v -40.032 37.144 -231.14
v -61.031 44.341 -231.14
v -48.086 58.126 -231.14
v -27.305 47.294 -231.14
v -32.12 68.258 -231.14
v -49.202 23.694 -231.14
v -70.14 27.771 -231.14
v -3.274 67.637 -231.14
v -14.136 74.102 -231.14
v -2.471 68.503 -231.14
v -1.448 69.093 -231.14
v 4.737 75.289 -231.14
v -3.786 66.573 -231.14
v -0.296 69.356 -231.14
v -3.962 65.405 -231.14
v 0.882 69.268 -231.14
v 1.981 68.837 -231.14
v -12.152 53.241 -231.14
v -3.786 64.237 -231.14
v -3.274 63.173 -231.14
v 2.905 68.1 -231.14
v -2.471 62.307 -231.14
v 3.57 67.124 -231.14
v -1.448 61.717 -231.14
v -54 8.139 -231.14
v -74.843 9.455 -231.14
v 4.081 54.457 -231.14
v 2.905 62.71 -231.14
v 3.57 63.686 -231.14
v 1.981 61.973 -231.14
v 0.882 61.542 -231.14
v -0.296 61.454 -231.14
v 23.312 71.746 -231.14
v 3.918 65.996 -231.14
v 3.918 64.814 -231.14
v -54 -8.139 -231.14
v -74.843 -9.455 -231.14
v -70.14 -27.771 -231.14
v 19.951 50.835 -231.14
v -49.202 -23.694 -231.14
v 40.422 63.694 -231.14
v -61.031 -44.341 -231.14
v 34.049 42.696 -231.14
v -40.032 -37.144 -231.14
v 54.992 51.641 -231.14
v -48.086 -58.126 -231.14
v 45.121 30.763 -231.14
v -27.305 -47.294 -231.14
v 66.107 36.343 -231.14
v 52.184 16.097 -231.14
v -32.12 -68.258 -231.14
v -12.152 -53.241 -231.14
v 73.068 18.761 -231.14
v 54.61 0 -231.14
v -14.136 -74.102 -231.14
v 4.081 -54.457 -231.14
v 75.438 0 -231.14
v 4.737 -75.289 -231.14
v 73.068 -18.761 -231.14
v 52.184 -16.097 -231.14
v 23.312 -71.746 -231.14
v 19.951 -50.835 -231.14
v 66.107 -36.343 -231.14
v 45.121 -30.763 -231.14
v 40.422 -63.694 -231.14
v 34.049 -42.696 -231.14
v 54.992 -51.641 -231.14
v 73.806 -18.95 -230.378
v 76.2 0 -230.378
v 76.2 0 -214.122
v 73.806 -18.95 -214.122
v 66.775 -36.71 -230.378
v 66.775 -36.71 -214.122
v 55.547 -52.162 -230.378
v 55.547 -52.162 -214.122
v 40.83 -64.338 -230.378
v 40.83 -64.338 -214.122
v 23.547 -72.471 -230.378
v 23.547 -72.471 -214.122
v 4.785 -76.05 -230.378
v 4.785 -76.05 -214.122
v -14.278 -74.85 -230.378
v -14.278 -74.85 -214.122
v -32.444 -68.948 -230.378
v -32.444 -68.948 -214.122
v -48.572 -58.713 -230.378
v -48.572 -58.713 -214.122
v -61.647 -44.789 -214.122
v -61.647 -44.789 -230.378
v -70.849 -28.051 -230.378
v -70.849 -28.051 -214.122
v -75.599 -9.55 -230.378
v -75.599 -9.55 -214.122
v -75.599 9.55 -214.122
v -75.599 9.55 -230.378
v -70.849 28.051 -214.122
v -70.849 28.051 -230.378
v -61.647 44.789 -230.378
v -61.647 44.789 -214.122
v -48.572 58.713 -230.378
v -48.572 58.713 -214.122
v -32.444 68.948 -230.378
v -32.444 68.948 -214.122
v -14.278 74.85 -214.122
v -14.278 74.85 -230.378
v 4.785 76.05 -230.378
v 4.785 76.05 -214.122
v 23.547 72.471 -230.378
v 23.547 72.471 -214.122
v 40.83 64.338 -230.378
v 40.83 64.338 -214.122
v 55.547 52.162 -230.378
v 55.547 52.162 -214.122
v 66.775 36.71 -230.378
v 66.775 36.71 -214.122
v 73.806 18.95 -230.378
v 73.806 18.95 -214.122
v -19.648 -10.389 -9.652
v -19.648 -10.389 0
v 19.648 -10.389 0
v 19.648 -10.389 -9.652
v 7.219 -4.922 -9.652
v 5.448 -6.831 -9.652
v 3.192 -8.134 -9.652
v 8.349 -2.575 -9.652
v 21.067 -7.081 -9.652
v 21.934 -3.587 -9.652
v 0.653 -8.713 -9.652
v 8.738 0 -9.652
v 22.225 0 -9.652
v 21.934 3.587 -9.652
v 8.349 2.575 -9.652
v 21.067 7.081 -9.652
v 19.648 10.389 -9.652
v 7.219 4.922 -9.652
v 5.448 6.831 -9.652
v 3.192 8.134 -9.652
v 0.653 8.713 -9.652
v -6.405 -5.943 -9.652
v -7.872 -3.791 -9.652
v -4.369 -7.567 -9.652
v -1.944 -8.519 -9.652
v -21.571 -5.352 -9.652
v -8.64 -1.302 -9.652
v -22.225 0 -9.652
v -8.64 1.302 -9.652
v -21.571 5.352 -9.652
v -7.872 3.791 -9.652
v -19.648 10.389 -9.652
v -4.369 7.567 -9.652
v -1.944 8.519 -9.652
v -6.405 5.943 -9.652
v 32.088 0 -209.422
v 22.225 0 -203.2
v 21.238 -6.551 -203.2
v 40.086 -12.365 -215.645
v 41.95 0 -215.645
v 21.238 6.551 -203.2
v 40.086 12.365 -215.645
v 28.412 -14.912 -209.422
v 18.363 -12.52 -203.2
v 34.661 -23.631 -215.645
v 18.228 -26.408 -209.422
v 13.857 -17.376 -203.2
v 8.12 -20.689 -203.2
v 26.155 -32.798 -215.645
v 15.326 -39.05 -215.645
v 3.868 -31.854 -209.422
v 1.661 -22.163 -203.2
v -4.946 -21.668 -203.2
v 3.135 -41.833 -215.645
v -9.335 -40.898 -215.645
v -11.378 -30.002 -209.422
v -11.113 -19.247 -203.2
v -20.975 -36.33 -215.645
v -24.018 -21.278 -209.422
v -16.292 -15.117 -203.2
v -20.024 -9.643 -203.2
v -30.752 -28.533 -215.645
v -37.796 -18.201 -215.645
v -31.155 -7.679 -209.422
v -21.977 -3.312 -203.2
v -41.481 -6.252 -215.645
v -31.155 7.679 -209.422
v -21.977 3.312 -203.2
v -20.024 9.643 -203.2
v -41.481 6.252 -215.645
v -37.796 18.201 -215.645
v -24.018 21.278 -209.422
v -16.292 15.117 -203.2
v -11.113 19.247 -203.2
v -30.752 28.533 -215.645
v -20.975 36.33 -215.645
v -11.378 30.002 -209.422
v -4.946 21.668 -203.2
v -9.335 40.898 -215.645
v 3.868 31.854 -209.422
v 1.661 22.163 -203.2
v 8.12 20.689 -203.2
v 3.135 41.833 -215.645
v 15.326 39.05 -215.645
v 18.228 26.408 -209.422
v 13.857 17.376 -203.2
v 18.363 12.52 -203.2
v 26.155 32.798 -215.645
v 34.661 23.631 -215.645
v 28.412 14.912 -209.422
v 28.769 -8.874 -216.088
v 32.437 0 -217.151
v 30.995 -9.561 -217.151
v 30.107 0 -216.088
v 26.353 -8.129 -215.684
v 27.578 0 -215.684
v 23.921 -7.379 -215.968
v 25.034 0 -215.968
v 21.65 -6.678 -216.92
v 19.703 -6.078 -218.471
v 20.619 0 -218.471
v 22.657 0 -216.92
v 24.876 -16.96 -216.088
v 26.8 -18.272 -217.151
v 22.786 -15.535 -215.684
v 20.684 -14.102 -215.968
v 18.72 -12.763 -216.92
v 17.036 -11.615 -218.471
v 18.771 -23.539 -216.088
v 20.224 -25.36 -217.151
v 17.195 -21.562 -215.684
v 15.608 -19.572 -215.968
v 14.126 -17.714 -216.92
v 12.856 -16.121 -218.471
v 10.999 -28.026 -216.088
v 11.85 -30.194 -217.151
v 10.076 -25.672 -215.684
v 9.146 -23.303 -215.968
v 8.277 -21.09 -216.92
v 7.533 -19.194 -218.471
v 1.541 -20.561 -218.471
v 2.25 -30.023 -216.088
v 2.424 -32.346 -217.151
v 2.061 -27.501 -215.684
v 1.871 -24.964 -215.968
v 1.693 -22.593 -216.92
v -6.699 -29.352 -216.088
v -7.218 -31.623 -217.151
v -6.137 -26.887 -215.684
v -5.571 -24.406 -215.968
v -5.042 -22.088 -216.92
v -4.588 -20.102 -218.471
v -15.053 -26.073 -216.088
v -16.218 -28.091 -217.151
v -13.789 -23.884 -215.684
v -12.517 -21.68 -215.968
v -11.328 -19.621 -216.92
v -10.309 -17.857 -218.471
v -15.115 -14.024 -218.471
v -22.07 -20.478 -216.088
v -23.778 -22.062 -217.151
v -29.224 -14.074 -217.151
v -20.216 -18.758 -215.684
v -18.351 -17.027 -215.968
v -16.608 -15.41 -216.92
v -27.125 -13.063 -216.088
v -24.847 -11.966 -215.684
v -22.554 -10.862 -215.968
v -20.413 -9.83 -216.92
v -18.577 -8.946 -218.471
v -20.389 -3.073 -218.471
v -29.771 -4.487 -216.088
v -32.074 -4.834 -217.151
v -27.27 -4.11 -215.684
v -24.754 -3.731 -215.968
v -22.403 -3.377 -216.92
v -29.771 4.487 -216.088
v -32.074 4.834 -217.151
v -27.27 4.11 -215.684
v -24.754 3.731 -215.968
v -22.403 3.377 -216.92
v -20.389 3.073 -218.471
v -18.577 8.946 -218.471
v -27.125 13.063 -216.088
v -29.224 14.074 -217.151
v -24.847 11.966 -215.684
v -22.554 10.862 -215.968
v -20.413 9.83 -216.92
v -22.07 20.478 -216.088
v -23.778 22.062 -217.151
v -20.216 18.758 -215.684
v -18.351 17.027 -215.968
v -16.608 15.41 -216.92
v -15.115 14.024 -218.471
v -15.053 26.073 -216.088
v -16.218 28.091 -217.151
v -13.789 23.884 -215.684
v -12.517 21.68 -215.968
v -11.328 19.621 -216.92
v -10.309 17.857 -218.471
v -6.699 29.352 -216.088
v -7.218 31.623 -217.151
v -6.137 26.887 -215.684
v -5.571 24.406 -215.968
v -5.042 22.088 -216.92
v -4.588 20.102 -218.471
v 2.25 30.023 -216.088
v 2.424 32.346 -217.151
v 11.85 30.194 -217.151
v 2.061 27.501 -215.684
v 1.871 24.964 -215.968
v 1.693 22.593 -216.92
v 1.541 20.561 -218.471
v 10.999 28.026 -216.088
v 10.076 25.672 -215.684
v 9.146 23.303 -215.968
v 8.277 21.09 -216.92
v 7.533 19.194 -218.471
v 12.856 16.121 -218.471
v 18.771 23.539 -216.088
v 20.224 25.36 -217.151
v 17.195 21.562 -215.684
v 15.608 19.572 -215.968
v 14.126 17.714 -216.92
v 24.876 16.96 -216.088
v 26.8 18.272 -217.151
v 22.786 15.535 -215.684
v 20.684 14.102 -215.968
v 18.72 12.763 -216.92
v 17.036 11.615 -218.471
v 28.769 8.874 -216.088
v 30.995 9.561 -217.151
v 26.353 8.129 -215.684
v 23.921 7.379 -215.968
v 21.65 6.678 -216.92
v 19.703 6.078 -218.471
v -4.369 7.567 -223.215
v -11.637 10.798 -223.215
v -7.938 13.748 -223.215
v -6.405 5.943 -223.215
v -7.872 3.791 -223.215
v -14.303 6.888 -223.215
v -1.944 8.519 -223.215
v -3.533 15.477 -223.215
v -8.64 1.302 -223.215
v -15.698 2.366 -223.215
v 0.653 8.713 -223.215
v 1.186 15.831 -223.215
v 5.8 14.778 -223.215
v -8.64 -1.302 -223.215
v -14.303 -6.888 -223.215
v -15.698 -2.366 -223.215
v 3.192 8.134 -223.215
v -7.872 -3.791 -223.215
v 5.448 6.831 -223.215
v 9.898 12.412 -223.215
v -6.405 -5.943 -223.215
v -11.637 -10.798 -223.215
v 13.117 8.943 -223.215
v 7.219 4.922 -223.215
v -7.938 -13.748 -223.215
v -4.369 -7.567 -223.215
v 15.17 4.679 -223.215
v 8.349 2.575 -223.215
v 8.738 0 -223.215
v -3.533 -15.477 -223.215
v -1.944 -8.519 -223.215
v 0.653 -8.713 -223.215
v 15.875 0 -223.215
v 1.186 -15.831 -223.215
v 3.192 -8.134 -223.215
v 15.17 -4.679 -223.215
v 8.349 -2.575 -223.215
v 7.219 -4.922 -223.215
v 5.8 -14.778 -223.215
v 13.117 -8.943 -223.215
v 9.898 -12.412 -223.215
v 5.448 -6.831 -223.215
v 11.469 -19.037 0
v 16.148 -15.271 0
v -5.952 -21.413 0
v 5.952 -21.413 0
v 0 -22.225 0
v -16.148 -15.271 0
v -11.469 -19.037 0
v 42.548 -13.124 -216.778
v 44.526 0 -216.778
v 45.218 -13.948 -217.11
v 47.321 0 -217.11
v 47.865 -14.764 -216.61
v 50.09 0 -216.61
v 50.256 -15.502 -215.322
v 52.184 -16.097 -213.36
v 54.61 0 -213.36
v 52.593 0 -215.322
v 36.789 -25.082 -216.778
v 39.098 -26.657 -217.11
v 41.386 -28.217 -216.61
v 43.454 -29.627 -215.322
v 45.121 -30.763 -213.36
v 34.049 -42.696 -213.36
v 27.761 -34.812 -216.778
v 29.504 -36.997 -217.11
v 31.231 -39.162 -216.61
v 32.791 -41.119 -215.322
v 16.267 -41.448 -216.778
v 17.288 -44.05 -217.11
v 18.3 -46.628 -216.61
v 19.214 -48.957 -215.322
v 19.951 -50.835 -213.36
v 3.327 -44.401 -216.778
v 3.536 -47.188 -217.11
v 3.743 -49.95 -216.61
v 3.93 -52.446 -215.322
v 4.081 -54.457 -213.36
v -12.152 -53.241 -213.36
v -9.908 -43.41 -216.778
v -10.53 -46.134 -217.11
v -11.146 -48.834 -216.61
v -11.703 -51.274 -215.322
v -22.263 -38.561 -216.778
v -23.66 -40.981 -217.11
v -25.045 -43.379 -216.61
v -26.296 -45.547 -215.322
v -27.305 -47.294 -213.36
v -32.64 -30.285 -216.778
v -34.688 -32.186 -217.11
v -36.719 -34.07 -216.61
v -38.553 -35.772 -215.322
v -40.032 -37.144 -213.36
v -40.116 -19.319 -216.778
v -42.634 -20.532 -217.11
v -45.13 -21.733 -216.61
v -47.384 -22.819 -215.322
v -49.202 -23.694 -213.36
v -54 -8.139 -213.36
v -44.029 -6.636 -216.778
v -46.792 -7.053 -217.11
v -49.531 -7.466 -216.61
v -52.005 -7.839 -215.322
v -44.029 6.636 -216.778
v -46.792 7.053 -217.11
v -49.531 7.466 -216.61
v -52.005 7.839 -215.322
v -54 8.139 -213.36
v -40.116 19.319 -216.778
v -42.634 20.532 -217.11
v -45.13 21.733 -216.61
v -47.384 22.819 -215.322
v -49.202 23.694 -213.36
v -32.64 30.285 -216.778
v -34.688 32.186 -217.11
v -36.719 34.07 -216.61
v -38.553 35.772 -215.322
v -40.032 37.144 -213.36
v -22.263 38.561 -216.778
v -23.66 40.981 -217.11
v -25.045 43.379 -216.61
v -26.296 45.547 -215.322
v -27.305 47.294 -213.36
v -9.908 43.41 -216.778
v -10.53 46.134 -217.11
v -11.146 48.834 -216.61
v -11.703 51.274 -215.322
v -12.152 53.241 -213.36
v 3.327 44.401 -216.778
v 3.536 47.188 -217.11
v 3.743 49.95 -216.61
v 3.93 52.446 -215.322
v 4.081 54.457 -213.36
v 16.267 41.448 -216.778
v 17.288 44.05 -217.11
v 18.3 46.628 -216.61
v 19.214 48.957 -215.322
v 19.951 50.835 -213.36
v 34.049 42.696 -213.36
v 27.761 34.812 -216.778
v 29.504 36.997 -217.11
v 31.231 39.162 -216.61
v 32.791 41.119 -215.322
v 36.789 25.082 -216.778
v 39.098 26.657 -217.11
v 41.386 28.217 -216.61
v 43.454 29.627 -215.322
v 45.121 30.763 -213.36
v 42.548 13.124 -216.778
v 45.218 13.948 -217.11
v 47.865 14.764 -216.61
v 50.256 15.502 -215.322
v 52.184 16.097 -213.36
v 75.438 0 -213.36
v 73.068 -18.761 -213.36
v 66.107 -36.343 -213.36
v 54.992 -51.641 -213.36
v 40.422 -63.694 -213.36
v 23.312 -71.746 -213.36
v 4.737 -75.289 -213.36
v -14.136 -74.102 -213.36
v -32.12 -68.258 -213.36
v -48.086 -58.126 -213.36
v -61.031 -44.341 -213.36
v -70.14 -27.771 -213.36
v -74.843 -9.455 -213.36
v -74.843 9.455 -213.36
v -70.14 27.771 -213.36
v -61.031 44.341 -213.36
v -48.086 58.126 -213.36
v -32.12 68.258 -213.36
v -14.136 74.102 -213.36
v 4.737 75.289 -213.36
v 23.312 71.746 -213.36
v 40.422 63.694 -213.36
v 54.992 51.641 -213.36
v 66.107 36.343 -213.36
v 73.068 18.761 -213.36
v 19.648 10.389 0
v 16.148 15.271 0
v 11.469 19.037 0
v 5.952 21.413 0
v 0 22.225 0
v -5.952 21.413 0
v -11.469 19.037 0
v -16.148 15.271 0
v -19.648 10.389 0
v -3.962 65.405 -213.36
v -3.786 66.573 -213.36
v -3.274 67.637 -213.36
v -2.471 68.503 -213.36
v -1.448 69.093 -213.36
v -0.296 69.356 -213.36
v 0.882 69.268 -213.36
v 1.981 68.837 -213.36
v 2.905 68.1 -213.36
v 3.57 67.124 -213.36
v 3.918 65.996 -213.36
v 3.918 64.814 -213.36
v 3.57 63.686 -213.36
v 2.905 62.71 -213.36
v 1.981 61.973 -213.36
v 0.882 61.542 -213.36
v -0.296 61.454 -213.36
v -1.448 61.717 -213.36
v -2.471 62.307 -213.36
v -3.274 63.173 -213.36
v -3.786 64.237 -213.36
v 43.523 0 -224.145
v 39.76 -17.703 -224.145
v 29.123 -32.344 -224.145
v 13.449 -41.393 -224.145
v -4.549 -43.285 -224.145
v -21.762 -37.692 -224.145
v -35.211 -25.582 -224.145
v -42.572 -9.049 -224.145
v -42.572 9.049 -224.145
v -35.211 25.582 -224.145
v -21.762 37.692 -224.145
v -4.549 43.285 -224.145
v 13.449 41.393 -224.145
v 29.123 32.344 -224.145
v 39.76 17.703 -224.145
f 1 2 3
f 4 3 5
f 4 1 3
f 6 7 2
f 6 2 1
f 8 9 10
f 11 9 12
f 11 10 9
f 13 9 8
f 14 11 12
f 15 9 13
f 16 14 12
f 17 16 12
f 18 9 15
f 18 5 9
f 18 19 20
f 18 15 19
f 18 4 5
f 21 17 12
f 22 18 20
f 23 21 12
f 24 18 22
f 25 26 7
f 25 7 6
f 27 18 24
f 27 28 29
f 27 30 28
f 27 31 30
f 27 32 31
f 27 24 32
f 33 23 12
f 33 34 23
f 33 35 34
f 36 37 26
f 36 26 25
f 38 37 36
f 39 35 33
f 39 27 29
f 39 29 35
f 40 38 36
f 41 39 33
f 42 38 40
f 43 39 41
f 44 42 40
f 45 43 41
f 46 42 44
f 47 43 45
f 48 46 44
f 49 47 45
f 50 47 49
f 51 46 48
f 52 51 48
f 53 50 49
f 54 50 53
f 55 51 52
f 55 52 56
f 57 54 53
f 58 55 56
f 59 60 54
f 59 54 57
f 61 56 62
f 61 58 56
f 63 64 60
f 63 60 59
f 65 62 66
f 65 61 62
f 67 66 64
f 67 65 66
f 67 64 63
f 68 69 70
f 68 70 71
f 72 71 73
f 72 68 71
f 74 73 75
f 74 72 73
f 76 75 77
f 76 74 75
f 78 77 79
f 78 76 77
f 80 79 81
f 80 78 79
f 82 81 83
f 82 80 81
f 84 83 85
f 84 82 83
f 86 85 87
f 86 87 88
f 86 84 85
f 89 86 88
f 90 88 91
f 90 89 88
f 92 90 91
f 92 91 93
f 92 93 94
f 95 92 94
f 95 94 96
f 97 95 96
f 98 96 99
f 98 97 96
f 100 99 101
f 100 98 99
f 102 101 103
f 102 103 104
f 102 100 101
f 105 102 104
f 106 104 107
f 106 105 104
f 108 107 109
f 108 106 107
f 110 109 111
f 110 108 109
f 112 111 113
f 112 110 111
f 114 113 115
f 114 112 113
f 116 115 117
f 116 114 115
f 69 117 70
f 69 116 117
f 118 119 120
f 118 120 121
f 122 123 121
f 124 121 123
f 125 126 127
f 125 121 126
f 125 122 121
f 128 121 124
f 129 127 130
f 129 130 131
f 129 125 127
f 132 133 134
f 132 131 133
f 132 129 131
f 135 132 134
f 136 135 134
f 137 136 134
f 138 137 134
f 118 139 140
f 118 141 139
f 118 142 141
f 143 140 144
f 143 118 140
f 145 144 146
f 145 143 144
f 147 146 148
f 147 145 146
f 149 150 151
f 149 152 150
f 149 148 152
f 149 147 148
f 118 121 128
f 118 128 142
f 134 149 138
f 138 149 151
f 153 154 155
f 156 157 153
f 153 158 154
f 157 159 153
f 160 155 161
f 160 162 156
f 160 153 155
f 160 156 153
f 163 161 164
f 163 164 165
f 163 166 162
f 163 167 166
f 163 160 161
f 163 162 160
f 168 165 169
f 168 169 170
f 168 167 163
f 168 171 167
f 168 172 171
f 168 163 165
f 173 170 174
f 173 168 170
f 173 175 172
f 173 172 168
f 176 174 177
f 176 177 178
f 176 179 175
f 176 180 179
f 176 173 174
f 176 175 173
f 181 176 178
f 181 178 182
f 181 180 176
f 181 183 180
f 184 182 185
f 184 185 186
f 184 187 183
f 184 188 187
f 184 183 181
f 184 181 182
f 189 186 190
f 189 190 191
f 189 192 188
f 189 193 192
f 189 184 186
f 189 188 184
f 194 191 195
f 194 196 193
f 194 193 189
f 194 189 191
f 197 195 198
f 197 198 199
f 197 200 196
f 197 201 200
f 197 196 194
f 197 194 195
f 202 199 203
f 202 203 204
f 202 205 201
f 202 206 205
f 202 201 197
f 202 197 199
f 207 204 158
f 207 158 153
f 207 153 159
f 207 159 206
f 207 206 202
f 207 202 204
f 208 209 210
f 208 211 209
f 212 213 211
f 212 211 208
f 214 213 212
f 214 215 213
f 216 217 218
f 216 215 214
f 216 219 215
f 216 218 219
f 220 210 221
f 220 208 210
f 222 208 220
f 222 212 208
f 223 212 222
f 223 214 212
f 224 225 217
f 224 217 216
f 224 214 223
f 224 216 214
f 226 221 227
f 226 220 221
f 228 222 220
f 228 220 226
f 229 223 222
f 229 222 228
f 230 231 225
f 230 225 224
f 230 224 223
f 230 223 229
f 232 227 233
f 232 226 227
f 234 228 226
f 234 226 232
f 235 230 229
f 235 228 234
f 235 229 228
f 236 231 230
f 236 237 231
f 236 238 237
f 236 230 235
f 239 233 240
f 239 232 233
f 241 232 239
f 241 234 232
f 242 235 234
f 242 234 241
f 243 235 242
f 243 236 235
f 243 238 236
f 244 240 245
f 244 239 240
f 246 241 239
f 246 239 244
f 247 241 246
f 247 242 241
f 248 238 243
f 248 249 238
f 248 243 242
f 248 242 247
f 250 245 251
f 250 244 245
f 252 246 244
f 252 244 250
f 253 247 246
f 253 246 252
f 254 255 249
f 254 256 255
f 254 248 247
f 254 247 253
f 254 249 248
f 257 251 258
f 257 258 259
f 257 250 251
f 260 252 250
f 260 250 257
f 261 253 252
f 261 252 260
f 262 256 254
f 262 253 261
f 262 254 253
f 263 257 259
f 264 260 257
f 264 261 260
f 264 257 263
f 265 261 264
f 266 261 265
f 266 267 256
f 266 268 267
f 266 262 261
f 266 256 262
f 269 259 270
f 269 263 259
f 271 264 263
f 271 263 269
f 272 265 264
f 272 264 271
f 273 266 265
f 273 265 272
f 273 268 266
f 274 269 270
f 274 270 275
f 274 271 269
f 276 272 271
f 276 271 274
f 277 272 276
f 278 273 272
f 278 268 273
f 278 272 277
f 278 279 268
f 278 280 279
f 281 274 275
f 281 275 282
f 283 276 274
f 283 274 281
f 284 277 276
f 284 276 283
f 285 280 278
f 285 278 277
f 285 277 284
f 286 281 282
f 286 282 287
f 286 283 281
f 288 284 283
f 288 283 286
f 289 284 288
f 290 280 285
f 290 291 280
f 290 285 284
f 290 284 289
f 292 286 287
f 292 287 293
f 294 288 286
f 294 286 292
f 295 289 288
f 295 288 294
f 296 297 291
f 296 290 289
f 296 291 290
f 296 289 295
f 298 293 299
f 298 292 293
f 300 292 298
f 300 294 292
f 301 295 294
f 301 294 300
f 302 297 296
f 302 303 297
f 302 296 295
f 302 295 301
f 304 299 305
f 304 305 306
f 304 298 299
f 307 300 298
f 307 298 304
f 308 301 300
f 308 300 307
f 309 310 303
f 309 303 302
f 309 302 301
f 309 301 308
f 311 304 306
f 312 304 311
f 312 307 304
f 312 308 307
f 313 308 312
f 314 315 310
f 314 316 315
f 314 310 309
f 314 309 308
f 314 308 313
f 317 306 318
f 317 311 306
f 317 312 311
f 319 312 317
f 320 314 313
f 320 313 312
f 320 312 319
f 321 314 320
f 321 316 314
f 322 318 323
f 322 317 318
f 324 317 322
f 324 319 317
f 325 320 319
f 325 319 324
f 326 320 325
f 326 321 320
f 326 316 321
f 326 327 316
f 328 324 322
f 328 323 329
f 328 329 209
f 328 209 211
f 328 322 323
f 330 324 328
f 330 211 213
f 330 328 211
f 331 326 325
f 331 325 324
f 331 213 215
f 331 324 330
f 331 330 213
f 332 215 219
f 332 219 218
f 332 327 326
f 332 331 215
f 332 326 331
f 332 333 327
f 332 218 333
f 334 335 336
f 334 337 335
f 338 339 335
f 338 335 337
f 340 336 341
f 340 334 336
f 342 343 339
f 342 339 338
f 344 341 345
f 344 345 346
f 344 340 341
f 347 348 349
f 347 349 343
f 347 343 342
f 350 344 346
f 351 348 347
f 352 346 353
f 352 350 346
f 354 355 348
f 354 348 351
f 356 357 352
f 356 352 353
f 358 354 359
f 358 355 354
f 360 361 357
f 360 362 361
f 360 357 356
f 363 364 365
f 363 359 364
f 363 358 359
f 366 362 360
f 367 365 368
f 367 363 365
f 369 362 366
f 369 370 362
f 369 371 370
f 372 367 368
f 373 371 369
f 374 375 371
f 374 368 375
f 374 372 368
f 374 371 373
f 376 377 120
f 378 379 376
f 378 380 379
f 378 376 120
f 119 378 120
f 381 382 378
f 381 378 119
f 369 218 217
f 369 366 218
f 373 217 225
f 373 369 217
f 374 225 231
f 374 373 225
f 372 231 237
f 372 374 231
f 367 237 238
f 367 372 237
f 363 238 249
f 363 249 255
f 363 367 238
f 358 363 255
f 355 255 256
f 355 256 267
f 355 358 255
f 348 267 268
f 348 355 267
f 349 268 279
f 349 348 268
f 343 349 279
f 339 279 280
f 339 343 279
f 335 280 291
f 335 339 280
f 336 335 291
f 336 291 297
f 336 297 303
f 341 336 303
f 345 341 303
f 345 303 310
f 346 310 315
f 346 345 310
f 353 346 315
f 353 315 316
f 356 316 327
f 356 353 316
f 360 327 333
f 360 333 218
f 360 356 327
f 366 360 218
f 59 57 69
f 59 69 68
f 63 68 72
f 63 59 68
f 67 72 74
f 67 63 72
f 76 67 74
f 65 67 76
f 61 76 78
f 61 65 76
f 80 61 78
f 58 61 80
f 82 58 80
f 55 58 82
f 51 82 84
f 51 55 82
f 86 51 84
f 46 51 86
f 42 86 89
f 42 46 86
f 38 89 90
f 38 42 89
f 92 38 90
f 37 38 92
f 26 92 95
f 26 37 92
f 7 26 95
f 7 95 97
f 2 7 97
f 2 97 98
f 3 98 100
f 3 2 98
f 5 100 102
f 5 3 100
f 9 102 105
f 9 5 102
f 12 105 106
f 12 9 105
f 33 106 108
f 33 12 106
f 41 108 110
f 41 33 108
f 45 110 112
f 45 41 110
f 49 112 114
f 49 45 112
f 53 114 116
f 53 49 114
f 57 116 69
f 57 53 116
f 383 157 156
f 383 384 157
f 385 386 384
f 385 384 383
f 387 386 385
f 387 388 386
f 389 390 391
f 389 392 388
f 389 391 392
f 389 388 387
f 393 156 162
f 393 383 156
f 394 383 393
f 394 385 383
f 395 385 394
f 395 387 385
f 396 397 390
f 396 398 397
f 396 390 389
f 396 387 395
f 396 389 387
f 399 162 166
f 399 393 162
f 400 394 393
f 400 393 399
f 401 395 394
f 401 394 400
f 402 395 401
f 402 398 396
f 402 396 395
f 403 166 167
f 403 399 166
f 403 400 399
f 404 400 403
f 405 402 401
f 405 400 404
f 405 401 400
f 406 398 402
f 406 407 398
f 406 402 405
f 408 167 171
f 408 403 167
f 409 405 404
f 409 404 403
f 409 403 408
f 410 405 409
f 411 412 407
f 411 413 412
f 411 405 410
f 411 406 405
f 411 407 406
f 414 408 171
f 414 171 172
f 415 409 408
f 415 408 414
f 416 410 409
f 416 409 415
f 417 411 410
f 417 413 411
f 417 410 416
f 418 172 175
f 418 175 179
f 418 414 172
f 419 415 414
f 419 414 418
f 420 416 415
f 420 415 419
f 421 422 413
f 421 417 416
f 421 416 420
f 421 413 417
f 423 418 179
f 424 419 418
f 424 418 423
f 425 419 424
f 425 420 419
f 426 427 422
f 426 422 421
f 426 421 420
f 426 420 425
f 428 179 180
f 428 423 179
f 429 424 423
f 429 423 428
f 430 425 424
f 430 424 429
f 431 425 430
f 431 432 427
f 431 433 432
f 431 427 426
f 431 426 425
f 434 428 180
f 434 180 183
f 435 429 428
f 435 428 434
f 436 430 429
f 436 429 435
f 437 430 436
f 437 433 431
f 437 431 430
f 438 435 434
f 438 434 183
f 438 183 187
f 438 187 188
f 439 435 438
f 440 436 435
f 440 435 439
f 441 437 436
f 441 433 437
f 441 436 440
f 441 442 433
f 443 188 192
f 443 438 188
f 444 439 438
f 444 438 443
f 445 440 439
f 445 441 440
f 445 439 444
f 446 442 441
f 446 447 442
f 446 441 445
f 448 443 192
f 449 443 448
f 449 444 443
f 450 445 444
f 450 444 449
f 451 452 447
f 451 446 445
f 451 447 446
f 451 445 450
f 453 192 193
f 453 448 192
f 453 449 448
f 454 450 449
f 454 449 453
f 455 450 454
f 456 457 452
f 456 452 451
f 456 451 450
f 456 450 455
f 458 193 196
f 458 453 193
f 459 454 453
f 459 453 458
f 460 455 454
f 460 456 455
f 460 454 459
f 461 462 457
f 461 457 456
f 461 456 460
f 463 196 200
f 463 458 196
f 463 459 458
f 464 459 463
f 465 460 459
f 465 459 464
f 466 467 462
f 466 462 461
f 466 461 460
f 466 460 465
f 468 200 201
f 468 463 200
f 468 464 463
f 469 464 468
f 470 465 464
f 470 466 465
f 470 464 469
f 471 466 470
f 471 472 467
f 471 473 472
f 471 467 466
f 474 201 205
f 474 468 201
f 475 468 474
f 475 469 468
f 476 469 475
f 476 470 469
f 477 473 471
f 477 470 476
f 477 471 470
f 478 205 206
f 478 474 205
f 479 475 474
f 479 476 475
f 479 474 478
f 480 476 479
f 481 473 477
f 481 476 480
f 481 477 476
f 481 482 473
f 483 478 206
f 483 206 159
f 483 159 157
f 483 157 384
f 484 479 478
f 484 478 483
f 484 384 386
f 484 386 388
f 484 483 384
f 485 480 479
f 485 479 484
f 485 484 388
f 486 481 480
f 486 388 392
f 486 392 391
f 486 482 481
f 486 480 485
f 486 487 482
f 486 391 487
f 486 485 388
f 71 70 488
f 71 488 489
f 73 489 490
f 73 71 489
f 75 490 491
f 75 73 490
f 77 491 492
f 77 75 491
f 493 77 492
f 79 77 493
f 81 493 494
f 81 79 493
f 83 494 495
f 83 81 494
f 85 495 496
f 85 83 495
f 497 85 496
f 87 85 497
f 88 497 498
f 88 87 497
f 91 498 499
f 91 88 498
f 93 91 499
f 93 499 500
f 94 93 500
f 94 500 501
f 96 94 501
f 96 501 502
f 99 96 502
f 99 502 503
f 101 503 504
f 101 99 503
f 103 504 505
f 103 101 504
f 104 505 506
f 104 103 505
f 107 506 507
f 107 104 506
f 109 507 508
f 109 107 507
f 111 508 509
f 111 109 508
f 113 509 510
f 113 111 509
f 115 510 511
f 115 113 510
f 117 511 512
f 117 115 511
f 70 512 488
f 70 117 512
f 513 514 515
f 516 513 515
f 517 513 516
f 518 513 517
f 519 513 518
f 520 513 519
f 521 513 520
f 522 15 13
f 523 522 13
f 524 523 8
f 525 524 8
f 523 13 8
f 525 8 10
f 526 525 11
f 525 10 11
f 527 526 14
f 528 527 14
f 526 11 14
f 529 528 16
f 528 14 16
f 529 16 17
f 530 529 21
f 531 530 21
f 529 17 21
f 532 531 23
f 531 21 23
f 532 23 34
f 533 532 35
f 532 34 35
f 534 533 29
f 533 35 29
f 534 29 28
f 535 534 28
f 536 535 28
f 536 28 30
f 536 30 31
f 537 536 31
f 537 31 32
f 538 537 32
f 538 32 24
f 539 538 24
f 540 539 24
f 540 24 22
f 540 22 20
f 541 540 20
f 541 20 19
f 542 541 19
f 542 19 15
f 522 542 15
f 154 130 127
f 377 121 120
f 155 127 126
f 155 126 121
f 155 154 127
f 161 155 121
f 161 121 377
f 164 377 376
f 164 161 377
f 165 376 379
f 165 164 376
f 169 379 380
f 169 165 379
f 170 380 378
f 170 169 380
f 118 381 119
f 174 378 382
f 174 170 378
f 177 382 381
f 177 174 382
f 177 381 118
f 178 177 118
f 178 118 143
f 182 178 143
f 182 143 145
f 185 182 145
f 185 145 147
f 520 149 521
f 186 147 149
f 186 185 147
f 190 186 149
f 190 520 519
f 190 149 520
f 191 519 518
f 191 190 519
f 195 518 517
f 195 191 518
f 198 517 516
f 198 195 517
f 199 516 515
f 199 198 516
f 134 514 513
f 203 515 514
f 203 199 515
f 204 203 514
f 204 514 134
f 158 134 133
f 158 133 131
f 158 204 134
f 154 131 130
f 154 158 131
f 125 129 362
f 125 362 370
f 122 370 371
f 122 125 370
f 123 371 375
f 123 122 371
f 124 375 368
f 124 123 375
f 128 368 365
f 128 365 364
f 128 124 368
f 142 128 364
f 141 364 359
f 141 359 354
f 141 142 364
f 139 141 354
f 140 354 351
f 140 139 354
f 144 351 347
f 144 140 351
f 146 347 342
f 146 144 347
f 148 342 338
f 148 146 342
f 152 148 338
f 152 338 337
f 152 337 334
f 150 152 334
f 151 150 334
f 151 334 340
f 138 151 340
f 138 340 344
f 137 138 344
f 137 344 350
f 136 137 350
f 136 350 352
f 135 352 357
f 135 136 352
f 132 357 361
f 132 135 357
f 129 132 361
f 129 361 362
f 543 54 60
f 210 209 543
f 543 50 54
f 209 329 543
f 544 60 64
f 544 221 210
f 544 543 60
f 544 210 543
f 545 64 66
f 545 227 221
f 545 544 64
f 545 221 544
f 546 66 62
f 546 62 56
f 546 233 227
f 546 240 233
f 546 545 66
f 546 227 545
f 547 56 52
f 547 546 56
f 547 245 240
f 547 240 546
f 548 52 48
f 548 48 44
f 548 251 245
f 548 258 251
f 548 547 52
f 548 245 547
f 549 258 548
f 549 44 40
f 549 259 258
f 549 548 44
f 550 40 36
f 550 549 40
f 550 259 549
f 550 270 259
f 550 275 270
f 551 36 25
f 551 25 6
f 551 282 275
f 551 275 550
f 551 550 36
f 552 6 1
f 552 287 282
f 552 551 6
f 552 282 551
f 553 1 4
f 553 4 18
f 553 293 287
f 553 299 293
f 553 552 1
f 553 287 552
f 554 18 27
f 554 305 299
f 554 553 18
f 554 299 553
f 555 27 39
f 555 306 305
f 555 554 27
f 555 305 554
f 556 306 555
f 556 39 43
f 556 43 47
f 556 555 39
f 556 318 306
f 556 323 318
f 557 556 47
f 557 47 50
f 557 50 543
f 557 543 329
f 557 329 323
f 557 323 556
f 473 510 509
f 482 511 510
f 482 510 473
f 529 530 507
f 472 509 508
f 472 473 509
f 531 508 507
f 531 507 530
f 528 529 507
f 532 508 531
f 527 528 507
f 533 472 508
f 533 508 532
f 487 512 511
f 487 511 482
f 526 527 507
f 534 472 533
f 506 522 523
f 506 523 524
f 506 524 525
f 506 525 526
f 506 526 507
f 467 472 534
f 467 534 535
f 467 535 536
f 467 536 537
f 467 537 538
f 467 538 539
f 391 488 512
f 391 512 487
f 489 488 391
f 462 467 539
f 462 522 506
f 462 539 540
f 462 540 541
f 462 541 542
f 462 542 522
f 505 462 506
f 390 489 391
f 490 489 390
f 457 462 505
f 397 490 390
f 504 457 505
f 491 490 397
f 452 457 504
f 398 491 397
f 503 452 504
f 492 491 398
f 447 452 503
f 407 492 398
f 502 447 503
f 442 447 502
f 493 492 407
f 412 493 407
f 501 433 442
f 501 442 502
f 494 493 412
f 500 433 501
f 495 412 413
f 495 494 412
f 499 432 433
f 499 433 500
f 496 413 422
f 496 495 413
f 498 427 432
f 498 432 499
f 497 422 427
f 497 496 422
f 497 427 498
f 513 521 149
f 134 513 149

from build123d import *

# Parameters (mm, degrees)
CHAMFER1_SIZE           = 0.762
CUT_EXTRUDE1_DEPTH      = 256.026625277
CUT_EXTRUDE1_DEPTH_BACK = 256.026625277
SKETCH2_W               = 9.652
SKETCH2_H               = 20.7772
SKETCH3_R               = 3.9624
CUT_EXTRUDE2_DEPTH      = 256.026625277


with BuildPart() as part:
    # Sketch1 → Revolve1 (revolve)
    with BuildSketch(Plane(origin=(0, 0, 0), x_dir=(0, 0, -1), z_dir=(1, 0, 0)), mode=Mode.PRIVATE) as revolve1_sk:
        with BuildLine():
            Line((0, 8.7376), (0, 22.225))
            Line((0, 22.225), (203.2, 22.225))
            Line((203.2, 22.225), (215.644604414, 41.950024019))
            ThreePointArc((215.644604414, 41.950024019), (216.962465562, 48.723970202), (213.36, 54.61))
            Line((213.36, 54.61), (213.36, 76.2))
            Line((213.36, 76.2), (231.14, 76.2))
            Line((231.14, 76.2), (231.14, 54.61))
            Line((231.14, 54.61), (217.150682631, 32.43656548))
            ThreePointArc((217.150682631, 32.43656548), (215.740333448, 26.296391433), (218.471224769, 20.618975231))
            Line((218.471224769, 20.618975231), (223.2152, 15.875))
            Line((223.2152, 15.875), (223.2152, 8.7376))
            Line((223.2152, 8.7376), (0, 8.7376))
        make_face()
    revolve(revolve1_sk.sketch.rotate(Axis((0, 0, 0), (0, 0, -1)), 90), axis=Axis((0, 0, 0), (0, 0, -1)))

    # Chamfer1
    chamfer1_edges = [part.edges().sort_by_distance(p)[0] for p in [
        (-76.2, 0, -231.14),
        (-76.2, 0, -213.36),
    ]]
    chamfer(chamfer1_edges, length=CHAMFER1_SIZE)

    # Sketch2 → Cut-Extrude1 (cut, two sides: drawn at the far end of the back side and taken through both)
    with BuildSketch(Plane(origin=(0, 0, 0), x_dir=(0, 0, -1), z_dir=(1, 0, 0)).offset(-CUT_EXTRUDE1_DEPTH_BACK)):
        with Locations((4.826, 0)):
            Rectangle(SKETCH2_W, SKETCH2_H)
    extrude(amount=CUT_EXTRUDE1_DEPTH + CUT_EXTRUDE1_DEPTH_BACK, mode=Mode.SUBTRACT)

    # Sketch3 → Cut-Extrude2 (cut, through all)
    with BuildSketch(Plane(origin=(0, 0, -231.14), x_dir=(-1, 0, 0), z_dir=(0, 0, -1))):
        with Locations((0, 65.405)):
            Circle(SKETCH3_R)
    extrude(amount=-CUT_EXTRUDE2_DEPTH, mode=Mode.SUBTRACT)


solid = part.part
